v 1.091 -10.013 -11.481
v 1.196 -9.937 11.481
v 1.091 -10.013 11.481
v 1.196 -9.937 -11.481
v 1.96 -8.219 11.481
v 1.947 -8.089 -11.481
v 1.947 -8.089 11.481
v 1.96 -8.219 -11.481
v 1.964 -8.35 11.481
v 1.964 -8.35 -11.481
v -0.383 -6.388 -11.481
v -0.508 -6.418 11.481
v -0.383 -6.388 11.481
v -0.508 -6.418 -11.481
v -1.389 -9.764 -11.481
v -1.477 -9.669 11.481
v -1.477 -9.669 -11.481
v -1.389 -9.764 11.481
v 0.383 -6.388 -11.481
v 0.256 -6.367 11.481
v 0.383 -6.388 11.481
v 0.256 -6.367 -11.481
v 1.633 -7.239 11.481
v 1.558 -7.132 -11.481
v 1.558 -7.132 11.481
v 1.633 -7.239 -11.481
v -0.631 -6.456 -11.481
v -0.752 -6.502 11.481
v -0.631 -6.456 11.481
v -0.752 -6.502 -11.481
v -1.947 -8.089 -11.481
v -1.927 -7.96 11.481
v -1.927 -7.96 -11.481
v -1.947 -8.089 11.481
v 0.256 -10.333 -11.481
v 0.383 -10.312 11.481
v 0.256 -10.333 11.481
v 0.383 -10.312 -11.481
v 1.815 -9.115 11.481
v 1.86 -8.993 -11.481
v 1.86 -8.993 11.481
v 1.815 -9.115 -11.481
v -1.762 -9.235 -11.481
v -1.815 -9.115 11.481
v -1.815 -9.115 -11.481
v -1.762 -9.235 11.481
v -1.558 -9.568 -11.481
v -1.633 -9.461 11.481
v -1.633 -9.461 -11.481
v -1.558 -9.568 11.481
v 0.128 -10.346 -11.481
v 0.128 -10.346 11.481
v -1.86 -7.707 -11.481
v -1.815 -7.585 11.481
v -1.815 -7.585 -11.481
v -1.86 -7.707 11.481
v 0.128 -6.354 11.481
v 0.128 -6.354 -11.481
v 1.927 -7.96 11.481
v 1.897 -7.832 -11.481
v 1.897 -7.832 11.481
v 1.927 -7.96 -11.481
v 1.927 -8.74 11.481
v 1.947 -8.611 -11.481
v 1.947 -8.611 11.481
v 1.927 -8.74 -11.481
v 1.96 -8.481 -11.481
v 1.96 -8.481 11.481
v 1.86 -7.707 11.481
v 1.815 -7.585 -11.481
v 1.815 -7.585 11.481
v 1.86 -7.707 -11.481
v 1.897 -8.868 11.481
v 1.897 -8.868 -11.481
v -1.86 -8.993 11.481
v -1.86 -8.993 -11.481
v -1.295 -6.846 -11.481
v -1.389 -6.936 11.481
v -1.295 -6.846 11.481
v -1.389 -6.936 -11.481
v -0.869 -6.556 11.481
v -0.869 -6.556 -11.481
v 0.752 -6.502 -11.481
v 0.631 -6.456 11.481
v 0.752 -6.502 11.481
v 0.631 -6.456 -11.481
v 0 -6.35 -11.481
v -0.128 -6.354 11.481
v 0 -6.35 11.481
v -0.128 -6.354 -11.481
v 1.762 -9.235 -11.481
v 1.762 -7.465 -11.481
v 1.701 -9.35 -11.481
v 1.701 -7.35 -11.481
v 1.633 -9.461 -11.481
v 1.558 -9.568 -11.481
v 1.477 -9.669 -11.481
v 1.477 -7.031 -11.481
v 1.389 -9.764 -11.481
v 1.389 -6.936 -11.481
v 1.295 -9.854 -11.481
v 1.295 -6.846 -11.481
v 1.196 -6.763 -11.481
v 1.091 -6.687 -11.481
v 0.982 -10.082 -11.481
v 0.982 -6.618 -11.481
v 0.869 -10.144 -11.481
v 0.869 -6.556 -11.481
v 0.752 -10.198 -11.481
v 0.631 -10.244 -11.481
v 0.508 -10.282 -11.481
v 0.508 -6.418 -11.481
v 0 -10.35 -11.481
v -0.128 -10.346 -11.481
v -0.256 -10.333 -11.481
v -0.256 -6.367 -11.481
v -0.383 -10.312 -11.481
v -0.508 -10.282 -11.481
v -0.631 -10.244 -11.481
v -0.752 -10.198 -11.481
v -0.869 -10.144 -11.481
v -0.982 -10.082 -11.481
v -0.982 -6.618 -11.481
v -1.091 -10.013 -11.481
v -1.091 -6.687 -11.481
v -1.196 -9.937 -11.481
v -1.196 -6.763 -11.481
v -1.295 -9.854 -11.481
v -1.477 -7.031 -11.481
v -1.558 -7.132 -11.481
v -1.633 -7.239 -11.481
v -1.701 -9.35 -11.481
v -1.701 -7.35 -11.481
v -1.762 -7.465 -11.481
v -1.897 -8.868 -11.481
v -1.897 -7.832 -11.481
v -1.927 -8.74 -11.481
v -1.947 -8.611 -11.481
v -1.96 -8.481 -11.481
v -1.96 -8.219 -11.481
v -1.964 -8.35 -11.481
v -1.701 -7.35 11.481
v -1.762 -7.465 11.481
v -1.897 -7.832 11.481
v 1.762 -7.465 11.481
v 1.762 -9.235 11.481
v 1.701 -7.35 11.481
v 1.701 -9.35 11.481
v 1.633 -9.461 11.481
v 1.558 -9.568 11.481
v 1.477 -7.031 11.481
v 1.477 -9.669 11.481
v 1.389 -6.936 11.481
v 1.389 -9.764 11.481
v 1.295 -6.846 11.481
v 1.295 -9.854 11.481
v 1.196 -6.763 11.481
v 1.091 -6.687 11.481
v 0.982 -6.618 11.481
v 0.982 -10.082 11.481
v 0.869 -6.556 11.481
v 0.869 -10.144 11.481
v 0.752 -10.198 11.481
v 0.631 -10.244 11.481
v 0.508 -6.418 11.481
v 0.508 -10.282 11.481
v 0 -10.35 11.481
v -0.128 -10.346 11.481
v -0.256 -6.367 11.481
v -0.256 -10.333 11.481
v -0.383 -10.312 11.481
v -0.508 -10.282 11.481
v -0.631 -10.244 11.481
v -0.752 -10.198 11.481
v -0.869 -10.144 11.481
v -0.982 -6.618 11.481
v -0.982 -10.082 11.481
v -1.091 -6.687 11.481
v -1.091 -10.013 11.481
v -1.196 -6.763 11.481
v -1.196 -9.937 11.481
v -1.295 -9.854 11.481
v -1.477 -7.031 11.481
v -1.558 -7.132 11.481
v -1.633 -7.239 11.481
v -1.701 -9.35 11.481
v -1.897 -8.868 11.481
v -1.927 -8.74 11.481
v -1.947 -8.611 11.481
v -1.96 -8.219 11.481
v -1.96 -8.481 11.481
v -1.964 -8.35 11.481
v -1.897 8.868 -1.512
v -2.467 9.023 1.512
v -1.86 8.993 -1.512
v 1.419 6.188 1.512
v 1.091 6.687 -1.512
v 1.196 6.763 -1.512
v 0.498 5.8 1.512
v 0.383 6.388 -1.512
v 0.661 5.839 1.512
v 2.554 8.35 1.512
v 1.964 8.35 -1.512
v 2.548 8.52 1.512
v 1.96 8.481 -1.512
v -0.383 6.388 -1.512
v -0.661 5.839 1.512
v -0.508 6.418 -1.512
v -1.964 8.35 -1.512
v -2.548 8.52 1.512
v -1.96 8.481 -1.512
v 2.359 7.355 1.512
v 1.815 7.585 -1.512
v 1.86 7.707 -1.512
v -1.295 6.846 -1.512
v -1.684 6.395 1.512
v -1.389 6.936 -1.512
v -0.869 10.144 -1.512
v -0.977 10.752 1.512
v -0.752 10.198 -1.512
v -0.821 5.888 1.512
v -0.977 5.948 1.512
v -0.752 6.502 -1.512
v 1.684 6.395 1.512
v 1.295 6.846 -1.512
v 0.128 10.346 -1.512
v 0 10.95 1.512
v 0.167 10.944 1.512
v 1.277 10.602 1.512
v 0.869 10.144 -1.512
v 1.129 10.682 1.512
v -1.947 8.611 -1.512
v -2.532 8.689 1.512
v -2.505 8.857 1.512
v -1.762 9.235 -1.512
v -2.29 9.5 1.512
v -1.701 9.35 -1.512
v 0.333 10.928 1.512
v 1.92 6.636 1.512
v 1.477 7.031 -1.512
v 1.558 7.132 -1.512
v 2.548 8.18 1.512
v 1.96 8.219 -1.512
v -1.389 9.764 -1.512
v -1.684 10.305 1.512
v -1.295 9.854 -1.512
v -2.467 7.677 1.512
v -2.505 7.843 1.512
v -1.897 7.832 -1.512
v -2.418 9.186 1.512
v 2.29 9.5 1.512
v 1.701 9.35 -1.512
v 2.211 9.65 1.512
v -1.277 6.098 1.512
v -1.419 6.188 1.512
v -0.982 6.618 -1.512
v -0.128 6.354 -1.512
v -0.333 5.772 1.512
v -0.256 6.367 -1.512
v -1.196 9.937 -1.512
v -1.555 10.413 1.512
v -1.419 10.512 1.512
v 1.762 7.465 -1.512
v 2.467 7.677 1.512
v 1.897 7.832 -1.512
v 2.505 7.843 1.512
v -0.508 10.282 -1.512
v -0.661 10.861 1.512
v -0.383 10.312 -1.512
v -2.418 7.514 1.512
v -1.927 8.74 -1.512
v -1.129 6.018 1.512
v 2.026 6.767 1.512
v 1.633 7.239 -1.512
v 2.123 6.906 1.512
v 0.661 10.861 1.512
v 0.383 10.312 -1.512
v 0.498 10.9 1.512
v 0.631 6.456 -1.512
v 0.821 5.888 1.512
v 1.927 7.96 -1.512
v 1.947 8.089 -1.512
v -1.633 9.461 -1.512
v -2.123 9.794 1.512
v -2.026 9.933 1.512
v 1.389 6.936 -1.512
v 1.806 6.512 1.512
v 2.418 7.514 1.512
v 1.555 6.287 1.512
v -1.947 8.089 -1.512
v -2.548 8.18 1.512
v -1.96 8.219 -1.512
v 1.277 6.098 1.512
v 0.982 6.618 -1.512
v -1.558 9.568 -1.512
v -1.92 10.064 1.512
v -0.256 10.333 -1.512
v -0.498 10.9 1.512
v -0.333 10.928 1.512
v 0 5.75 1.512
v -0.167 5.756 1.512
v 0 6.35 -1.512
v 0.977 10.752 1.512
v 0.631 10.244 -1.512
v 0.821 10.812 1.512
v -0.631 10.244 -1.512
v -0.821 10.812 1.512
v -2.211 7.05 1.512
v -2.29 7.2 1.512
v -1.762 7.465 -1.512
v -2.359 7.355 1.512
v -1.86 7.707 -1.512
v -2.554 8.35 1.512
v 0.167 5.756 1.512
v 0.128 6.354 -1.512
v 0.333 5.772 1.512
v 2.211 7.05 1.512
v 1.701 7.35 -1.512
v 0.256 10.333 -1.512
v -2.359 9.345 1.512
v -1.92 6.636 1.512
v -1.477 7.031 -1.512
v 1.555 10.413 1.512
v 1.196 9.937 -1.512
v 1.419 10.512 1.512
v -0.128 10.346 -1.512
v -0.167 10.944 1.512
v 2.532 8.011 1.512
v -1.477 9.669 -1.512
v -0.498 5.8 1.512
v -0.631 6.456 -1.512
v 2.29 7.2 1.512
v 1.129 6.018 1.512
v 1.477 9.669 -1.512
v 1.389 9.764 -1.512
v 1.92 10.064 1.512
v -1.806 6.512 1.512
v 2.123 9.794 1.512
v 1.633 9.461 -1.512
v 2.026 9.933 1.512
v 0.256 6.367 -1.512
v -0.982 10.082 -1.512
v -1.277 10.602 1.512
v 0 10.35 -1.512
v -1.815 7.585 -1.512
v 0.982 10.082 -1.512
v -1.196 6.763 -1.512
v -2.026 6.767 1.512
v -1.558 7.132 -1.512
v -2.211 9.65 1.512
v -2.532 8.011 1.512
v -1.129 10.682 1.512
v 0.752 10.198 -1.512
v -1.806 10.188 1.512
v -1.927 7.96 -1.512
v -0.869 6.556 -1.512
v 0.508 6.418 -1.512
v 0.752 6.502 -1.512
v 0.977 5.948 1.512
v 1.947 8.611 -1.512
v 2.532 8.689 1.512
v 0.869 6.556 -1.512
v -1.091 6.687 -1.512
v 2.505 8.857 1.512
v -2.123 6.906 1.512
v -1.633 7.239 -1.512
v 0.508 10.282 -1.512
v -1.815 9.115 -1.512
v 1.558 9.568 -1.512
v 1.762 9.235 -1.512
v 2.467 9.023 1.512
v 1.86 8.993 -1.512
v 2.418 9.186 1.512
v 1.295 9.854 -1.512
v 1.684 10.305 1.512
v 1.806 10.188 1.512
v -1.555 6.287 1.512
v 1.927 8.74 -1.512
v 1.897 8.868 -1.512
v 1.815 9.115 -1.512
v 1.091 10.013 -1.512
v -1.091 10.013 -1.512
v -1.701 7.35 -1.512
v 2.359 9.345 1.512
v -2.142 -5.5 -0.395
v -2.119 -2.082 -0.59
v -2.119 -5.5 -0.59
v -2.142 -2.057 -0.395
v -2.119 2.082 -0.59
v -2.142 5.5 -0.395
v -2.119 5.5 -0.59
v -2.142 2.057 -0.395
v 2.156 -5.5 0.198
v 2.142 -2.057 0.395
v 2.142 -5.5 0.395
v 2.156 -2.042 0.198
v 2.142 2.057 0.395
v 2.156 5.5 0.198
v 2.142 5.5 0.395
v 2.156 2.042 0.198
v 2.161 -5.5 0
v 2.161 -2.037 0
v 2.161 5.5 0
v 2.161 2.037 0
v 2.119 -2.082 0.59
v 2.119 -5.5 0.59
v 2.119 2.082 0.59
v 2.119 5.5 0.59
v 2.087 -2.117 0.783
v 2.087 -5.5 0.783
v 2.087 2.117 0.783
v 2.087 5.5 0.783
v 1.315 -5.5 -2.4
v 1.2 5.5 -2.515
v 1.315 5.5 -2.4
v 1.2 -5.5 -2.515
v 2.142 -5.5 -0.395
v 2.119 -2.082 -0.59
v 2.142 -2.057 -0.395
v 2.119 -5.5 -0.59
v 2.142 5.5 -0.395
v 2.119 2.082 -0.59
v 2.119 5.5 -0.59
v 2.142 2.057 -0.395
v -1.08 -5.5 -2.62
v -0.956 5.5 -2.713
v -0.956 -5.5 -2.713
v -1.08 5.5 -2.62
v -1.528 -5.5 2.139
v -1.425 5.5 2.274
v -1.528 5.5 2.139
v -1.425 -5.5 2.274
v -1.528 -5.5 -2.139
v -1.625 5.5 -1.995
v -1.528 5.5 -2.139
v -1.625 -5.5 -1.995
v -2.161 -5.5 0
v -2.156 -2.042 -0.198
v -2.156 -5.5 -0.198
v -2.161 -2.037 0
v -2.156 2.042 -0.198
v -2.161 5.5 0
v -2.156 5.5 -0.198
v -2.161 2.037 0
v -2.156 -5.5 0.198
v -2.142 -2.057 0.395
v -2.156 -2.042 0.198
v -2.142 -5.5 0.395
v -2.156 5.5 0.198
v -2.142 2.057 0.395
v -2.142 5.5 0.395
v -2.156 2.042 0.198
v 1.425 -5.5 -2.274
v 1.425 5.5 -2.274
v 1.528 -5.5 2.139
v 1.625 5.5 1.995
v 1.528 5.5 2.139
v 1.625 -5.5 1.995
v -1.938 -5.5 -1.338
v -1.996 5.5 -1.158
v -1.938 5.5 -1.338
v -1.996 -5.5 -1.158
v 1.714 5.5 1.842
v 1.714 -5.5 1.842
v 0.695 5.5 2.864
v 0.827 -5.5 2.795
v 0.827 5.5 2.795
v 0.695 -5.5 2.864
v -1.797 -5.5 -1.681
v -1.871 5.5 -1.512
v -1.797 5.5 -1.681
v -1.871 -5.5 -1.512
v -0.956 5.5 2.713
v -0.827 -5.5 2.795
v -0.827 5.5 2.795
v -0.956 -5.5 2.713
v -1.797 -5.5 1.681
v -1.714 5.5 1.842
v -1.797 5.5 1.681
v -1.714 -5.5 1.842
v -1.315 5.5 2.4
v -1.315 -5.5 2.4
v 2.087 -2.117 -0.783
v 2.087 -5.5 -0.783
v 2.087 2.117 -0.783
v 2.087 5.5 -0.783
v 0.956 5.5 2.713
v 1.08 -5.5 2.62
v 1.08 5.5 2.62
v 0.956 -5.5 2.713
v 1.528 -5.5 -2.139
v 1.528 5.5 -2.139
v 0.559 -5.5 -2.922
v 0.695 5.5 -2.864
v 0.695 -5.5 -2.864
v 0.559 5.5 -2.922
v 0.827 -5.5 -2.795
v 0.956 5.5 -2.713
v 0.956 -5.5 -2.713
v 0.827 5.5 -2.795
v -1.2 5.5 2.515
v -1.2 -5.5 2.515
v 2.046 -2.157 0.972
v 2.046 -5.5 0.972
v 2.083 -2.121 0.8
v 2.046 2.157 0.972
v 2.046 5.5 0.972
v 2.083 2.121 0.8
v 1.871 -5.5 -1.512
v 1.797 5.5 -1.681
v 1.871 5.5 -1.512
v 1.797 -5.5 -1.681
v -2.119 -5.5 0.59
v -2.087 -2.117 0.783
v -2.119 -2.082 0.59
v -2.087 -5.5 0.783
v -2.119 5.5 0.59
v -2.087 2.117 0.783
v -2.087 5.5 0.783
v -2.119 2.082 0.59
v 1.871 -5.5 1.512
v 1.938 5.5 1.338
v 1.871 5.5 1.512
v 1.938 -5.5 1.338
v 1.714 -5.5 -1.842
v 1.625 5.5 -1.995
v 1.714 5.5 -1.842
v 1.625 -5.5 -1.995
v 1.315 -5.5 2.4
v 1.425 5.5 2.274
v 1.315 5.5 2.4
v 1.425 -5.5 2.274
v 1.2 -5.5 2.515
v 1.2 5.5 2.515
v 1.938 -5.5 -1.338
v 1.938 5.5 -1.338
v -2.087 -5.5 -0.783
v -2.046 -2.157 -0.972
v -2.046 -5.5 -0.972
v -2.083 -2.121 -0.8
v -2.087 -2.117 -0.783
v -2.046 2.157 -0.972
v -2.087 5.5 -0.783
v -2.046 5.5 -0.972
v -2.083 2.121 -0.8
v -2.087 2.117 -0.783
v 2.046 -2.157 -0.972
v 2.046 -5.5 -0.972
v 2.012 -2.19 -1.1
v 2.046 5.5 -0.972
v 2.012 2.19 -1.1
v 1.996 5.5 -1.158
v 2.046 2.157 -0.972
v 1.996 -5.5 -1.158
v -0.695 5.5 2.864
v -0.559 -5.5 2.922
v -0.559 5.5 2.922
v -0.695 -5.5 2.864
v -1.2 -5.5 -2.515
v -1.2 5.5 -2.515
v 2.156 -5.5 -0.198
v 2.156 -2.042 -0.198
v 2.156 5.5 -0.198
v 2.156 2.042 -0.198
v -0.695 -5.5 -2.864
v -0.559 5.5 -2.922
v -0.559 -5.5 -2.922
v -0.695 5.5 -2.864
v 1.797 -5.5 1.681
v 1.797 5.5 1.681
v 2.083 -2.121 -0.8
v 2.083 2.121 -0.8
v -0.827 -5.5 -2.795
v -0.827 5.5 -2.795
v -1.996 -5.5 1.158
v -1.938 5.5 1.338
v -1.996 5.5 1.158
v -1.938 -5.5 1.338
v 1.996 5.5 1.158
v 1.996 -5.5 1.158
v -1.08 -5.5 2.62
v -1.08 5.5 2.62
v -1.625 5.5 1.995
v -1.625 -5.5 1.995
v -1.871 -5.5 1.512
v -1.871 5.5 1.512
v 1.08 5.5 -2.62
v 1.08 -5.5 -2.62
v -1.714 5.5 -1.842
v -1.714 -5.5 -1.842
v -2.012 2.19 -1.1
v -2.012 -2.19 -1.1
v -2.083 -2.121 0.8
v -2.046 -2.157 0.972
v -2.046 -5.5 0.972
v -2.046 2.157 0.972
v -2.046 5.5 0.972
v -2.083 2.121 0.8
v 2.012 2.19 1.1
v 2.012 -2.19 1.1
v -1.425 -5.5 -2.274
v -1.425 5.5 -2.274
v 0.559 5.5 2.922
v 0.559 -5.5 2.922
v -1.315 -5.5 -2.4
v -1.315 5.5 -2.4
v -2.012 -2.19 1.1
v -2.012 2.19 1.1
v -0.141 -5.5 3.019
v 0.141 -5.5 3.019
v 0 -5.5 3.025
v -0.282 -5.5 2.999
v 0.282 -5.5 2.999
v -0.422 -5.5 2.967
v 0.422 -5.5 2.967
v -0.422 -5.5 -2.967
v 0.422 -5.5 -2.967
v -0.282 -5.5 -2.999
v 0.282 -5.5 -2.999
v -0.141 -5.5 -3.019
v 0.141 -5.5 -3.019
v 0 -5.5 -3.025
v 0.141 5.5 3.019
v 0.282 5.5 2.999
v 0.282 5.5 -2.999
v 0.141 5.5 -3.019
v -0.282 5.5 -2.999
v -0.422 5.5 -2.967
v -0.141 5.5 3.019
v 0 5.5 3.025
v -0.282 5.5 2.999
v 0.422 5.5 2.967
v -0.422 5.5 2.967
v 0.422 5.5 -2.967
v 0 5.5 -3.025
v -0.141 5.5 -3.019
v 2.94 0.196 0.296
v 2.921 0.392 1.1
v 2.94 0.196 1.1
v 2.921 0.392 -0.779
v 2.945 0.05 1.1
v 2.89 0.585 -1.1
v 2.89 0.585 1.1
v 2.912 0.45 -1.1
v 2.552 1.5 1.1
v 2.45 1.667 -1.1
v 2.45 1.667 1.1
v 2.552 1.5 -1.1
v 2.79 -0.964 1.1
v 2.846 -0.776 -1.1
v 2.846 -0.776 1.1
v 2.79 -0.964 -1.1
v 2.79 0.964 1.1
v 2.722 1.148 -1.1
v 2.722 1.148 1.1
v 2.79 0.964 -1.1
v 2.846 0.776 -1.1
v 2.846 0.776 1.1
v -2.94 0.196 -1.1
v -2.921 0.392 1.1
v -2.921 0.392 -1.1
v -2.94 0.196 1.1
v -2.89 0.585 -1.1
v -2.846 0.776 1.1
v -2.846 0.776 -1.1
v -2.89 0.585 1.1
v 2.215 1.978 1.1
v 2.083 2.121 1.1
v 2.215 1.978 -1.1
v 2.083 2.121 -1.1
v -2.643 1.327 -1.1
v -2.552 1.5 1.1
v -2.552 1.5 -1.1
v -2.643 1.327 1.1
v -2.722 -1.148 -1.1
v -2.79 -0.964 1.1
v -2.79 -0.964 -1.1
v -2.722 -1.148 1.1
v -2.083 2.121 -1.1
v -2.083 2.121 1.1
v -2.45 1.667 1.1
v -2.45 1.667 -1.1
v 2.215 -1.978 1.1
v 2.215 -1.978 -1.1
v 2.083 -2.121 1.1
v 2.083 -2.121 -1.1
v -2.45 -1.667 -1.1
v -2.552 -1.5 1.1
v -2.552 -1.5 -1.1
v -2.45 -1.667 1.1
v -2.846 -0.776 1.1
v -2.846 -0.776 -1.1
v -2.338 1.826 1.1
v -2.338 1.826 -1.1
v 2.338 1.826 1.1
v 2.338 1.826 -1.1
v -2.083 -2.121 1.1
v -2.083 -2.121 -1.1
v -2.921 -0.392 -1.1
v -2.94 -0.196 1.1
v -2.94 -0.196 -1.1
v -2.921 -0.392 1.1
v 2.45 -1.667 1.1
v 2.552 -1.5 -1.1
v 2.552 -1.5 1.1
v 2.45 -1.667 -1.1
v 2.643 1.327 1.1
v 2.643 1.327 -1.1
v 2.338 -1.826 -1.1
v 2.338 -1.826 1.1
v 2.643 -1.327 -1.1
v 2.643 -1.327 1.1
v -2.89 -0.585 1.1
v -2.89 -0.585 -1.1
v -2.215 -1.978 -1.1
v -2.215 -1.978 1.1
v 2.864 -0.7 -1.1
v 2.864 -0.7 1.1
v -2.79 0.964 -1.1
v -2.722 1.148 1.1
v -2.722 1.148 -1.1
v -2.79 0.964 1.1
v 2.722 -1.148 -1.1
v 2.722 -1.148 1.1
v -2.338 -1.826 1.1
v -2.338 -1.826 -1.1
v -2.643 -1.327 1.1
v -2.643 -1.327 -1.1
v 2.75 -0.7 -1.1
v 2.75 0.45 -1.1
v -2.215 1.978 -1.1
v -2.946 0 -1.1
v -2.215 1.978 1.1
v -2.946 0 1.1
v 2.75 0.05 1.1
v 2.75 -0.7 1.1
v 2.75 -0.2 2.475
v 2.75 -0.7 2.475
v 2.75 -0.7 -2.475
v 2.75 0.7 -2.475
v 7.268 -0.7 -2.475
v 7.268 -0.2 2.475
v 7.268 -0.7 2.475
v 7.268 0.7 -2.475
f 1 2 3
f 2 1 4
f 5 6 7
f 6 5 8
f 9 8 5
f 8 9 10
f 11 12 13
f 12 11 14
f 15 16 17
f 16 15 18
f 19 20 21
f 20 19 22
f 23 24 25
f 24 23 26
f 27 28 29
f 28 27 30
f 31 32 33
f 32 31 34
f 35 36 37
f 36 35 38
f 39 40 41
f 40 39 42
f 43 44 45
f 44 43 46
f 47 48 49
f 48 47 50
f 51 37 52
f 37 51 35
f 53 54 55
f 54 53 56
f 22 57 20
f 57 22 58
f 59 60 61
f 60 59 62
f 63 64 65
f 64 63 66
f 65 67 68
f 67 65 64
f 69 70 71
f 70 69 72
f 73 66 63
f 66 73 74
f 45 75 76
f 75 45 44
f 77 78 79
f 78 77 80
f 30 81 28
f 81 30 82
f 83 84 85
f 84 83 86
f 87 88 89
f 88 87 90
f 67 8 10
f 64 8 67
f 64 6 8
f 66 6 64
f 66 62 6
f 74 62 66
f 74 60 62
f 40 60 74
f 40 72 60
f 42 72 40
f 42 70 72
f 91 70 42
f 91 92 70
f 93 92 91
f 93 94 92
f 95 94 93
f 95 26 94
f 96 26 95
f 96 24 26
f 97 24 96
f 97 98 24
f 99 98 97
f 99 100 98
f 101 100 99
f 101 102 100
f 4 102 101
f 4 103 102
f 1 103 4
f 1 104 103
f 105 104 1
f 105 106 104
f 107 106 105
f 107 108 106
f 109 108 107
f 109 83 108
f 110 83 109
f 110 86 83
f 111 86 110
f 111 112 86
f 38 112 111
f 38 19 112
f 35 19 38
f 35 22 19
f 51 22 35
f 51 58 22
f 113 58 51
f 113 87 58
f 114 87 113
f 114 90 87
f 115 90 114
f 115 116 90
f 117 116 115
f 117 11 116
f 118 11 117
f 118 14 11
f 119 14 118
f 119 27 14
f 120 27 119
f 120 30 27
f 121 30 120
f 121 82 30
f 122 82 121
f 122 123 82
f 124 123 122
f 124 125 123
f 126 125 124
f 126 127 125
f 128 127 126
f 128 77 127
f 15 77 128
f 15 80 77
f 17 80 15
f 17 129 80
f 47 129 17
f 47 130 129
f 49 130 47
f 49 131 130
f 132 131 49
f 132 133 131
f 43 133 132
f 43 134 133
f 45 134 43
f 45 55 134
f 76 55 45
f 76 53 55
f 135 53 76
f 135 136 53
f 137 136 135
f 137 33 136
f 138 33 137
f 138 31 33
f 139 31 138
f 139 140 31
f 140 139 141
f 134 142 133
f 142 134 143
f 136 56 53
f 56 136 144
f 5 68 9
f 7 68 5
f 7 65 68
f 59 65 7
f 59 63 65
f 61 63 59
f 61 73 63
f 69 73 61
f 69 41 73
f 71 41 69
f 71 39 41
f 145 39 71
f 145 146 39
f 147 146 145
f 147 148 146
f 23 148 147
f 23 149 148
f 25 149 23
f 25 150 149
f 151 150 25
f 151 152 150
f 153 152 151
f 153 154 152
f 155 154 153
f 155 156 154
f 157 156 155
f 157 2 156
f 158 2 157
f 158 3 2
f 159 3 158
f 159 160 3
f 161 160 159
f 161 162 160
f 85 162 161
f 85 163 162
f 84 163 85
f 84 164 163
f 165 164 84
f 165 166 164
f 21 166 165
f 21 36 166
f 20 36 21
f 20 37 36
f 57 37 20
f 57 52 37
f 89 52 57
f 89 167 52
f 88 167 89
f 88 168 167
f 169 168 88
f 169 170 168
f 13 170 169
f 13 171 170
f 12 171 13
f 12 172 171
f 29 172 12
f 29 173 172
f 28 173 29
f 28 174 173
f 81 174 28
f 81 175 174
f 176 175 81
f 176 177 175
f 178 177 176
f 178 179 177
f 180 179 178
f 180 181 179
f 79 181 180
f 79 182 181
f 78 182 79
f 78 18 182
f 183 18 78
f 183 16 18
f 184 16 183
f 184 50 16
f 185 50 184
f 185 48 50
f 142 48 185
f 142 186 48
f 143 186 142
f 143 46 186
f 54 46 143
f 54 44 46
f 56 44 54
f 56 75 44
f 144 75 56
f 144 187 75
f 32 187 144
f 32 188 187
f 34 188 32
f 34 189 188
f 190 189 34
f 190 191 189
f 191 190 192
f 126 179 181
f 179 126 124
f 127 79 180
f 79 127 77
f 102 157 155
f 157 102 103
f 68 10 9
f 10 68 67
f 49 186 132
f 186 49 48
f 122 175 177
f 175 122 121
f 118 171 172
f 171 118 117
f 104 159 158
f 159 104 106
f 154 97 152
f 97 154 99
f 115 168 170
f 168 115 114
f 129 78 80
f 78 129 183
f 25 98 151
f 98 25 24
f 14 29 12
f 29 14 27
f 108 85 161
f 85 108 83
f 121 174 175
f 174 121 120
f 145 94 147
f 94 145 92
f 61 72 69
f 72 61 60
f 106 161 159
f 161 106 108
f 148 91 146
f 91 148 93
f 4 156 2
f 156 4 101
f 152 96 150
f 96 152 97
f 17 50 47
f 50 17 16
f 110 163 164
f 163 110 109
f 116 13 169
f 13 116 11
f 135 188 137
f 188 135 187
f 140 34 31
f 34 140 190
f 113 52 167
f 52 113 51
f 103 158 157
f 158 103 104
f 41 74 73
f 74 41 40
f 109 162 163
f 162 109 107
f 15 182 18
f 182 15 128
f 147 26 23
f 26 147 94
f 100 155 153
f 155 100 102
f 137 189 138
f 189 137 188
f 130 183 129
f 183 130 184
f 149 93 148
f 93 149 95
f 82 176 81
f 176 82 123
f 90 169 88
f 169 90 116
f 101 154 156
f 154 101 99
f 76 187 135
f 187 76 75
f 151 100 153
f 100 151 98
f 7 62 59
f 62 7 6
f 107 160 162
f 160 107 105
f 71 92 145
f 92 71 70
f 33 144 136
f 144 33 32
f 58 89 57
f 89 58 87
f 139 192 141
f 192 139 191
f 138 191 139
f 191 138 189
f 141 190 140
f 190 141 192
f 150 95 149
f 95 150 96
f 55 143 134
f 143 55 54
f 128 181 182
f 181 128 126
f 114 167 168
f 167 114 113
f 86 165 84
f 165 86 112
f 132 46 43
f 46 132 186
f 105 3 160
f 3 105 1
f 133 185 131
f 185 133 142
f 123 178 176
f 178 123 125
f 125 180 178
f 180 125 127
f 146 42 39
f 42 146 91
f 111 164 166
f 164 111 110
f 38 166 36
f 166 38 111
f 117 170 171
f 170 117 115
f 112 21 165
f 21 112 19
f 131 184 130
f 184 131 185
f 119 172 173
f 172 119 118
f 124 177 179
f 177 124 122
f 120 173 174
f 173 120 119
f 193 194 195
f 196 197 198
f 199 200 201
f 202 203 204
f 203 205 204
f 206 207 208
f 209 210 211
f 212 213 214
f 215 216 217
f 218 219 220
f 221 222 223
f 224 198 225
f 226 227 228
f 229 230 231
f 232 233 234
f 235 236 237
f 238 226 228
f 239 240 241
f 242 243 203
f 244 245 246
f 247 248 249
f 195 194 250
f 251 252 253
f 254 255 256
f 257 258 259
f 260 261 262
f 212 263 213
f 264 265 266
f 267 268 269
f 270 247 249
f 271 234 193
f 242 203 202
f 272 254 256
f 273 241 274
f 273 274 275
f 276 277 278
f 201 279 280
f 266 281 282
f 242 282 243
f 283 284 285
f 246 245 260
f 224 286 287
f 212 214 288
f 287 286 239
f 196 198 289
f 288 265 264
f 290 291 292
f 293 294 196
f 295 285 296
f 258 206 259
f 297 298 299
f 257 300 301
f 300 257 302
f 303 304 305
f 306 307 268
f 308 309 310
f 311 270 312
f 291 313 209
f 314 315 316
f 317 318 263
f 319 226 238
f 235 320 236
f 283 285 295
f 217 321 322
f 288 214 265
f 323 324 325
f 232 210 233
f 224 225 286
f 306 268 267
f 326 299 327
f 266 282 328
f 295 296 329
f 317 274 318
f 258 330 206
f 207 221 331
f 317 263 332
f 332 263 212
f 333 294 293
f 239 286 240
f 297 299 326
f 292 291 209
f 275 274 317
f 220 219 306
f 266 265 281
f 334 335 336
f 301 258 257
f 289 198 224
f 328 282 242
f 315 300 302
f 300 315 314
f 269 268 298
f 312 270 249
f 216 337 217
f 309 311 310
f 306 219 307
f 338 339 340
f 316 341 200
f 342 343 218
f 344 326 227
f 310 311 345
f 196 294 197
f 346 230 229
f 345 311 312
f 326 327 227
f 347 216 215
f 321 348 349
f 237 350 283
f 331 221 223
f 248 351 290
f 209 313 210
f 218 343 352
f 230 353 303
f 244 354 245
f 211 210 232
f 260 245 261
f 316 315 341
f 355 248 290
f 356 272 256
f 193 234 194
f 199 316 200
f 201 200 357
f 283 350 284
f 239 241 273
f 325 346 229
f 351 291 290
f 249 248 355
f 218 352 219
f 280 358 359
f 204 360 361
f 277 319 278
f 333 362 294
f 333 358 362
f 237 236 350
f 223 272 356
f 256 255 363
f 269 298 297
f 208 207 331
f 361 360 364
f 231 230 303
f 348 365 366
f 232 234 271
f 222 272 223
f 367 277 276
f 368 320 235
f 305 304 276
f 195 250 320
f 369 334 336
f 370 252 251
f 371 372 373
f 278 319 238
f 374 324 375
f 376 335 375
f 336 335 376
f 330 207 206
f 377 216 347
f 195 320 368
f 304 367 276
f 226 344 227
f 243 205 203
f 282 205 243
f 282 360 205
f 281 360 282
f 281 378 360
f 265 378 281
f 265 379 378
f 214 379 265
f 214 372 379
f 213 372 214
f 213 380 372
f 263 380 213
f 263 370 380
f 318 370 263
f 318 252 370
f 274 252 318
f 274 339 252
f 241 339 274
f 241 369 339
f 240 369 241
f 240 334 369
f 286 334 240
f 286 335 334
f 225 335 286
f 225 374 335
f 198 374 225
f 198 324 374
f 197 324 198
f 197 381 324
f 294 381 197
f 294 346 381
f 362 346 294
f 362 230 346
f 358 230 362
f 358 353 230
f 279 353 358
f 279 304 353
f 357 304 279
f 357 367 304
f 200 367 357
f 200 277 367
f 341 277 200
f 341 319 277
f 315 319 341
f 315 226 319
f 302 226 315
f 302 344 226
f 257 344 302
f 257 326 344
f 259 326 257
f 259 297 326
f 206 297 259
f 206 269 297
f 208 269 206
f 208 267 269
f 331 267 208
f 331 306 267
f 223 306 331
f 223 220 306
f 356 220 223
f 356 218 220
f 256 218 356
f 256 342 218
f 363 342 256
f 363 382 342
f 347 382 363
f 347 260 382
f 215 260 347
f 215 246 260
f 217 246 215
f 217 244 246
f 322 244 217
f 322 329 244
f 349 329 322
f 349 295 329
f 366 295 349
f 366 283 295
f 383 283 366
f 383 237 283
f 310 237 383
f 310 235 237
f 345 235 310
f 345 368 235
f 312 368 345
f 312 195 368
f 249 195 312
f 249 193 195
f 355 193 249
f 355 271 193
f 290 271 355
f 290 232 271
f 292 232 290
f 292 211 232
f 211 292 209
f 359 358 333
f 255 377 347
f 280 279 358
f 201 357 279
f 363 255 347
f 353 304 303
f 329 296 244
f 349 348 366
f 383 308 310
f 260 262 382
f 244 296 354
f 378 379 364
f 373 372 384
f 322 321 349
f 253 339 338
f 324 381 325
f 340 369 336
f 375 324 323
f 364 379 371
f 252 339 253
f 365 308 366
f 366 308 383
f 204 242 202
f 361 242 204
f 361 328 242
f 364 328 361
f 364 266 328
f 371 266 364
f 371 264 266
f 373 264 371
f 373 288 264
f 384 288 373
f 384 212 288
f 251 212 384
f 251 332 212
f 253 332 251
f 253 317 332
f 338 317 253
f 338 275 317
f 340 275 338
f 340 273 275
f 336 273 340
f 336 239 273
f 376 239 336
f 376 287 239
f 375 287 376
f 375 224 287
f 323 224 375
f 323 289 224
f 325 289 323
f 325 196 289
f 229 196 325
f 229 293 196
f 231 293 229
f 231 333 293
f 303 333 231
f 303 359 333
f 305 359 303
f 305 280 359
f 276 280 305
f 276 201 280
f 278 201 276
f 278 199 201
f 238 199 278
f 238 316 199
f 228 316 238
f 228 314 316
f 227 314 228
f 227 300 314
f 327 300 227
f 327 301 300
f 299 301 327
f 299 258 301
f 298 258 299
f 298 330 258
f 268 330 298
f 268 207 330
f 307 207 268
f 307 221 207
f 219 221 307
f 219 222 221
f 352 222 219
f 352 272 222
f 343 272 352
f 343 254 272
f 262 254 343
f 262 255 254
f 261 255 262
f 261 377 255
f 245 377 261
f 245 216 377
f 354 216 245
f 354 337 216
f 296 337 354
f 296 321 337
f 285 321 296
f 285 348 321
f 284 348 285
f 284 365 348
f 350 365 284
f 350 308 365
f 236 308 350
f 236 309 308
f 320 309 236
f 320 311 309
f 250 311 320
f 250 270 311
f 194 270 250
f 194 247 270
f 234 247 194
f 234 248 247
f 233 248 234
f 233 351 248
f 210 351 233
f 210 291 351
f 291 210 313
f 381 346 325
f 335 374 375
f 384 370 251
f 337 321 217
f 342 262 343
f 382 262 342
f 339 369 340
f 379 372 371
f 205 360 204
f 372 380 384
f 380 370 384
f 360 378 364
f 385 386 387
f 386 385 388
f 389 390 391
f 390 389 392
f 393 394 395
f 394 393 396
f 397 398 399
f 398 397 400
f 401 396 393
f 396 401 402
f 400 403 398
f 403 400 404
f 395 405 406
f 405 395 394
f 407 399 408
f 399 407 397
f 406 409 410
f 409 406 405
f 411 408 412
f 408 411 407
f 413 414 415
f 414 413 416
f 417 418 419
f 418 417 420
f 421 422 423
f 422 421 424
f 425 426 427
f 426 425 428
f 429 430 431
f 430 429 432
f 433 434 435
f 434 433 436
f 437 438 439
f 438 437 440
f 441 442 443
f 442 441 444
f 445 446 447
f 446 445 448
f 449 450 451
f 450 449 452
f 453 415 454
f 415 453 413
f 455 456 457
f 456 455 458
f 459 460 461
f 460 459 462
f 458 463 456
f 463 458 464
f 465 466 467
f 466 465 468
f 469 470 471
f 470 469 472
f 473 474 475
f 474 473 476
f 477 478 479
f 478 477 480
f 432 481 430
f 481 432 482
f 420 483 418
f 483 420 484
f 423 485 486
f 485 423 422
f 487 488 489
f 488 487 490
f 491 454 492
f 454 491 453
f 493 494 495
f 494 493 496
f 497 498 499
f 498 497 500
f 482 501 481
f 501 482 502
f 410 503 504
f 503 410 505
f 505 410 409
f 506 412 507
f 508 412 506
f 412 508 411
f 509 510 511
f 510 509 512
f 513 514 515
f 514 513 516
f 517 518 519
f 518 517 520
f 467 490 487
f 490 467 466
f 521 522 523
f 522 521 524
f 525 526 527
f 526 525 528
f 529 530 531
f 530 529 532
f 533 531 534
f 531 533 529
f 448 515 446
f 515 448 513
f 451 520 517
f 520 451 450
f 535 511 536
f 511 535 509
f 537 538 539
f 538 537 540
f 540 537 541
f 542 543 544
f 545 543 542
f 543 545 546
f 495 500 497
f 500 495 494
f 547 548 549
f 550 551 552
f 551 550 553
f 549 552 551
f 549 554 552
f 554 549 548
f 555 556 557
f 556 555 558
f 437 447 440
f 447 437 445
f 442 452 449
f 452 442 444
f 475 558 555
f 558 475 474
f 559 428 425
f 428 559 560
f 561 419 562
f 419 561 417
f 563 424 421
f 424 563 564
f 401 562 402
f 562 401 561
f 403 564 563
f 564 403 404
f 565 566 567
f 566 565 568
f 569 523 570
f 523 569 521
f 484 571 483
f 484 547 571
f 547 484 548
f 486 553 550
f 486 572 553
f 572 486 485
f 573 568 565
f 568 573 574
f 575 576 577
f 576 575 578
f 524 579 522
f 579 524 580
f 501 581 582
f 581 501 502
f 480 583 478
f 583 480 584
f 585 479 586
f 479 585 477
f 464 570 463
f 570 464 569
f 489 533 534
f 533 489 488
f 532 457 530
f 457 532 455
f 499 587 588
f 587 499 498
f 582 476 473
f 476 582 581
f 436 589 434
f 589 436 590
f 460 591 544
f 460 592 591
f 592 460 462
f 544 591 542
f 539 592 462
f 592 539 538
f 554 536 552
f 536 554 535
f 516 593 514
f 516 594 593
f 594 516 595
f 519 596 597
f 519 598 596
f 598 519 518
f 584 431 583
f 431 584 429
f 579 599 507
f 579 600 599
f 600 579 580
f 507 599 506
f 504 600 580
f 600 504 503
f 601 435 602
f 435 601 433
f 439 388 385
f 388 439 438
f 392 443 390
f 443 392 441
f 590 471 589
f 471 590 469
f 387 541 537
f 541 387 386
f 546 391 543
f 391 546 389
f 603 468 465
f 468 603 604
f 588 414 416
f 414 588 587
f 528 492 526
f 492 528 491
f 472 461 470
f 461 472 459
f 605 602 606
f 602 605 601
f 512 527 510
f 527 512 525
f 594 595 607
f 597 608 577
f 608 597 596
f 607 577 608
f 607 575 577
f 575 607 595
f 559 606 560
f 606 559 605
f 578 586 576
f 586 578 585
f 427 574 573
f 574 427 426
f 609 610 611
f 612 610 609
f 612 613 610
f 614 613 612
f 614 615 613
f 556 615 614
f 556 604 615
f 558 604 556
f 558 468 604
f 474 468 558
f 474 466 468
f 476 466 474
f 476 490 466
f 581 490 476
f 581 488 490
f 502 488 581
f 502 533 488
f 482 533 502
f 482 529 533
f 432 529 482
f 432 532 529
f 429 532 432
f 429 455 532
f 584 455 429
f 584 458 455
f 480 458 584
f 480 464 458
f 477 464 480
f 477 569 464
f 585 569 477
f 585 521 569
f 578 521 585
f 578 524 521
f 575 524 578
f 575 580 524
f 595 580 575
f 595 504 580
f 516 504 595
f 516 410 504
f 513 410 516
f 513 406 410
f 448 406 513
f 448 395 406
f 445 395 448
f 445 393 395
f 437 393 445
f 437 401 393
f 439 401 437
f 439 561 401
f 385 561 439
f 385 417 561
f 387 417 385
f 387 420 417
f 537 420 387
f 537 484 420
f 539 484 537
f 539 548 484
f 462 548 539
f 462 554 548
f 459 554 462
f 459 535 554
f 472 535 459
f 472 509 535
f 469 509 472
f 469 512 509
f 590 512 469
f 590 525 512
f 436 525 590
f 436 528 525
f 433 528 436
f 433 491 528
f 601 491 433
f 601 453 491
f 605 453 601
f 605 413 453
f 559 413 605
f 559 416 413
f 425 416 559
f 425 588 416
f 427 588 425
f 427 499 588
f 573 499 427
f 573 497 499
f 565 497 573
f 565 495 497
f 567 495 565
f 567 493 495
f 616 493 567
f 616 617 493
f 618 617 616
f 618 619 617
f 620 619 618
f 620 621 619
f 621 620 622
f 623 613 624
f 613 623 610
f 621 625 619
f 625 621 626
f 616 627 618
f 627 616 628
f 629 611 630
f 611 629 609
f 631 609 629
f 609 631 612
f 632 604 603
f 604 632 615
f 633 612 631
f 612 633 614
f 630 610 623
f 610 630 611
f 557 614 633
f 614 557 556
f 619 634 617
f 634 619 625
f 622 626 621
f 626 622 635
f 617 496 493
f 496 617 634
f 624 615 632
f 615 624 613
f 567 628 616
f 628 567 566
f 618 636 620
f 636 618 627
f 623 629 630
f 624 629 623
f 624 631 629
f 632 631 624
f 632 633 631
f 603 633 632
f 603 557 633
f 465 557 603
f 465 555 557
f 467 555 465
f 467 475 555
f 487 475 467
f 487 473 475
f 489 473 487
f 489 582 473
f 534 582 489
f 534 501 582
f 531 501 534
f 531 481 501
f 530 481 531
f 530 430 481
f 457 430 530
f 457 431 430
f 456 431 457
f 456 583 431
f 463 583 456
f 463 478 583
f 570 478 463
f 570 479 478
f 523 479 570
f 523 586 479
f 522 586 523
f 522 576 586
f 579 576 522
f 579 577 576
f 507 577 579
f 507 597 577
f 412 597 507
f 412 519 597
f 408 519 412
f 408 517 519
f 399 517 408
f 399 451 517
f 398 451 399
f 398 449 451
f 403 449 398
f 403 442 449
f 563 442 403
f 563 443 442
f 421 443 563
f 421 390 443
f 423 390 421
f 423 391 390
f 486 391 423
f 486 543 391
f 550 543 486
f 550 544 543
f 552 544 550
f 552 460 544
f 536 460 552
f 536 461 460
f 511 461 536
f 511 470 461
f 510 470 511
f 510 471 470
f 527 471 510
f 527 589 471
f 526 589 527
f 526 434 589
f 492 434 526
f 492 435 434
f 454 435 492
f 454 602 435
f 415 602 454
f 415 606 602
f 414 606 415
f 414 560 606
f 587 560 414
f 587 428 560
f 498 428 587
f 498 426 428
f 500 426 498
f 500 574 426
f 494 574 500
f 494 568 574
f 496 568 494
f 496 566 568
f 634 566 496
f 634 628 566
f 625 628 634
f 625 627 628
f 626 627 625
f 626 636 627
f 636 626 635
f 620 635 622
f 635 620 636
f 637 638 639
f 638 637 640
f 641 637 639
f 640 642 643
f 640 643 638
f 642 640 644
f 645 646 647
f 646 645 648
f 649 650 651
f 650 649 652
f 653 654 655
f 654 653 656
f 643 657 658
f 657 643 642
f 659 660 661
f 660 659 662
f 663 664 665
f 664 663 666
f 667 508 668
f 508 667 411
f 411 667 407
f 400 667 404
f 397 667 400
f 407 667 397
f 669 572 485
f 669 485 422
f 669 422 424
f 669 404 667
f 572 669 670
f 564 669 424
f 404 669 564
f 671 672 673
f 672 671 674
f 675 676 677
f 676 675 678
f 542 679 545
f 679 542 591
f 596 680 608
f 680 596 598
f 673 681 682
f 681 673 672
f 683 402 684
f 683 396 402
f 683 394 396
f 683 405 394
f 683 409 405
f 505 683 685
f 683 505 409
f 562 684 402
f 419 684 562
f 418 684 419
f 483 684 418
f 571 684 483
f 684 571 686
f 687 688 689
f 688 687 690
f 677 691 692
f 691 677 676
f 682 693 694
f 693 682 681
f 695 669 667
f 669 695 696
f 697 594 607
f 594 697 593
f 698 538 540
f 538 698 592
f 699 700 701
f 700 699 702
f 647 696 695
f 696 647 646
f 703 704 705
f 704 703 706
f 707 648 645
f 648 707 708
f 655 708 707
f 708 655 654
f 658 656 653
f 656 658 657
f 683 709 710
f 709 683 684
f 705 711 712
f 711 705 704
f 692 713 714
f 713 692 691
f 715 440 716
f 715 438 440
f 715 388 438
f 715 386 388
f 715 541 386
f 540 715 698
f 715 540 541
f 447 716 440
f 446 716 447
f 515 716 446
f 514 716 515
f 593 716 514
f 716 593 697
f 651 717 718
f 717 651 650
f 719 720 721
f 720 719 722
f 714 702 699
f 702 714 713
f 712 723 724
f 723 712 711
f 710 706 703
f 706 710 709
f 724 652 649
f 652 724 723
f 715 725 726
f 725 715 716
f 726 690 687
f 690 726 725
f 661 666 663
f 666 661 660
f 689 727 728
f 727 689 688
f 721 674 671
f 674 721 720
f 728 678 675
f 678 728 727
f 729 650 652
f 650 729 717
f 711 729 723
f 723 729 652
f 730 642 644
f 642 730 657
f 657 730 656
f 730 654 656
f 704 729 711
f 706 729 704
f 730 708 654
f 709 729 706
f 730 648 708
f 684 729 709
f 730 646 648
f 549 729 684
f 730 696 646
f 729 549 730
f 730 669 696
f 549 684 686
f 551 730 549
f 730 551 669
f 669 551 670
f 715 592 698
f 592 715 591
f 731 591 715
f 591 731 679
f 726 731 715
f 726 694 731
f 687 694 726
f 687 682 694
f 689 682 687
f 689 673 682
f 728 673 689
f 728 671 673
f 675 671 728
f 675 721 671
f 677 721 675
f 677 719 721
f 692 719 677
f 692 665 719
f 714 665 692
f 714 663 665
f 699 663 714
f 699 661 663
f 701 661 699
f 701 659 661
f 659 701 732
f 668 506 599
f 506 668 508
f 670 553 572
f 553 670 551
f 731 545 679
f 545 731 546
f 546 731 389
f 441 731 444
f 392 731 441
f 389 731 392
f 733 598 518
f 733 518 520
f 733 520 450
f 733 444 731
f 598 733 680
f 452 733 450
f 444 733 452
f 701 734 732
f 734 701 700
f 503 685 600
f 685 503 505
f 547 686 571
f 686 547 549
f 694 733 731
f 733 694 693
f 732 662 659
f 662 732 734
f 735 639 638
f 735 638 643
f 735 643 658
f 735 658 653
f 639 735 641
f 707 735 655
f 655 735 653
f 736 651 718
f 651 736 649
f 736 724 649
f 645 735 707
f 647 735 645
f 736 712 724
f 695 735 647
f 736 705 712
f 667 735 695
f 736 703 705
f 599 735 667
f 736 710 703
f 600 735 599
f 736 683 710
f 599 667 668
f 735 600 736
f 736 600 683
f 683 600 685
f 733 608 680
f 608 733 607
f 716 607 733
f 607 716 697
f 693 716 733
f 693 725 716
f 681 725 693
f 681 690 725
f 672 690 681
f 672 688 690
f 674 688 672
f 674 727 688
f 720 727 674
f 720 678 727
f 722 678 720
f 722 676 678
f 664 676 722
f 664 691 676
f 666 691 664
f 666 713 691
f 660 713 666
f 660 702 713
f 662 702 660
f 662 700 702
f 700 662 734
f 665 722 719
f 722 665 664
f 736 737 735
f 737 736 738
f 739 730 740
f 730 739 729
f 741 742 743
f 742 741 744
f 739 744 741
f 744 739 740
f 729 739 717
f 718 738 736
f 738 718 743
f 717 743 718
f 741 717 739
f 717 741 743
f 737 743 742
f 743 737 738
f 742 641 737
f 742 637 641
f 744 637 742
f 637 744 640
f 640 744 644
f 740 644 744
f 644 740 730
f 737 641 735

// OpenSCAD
$fn=96;

bbox_x = 11.0;
bbox_y = 18.9;
bbox_z = 8.8;

shank_r = 2.0;
shank_len = 18.9;
flare_len = 2.2;
flare_r2 = 2.6;

cross_r = 2.2;
cross_len = 11.0;

boss_r = 3.0;
boss_t = 1.6;

tab_len = 4.6;
tab_w = 3.6;
tab_t = 1.4;
tab_wedge = 0.9;

fork_len = 3.2;
fork_gap = 1.2;
fork_prong_min = 0.9;
fork_prong_max = 1.6;

module shank_with_flare() {
    union() {
        translate([0, -shank_len/2 + flare_len/2, 0])
            cylinder(h=shank_len - flare_len, r=shank_r, center=true);
        translate([0, shank_len/2 - flare_len/2, 0])
            cylinder(h=flare_len, r1=shank_r, r2=flare_r2, center=true);
    }
}

module cross_body() {
    cylinder(h=cross_len, r=cross_r, center=true);
}

module boss() {
    cylinder(h=boss_t, r=boss_r, center=true);
}

module wedge_tab() {
    translate([boss_r + tab_len/2 - 0.2, 0, 0])
        rotate([0, 90, 0])
            linear_extrude(height=tab_len, center=true, convexity=10)
                polygon(points=[
                    [-tab_w/2, -tab_t/2],
                    [ tab_w/2, -tab_t/2],
                    [ tab_w/2,  tab_t/2],
                    [-tab_w/2,  tab_t/2 - tab_wedge]
                ]);
}

module fork_end() {
    difference() {
        translate([0, 0, cross_len/2 - fork_len/2])
            cylinder(h=fork_len, r=cross_r, center=true);
        translate([0, 0, cross_len/2 - fork_len/2])
            cube([fork_gap, 2*cross_r + 0.6, fork_len + 0.4], center=true);
        translate([0, 0, cross_len/2 - fork_len/2])
            rotate([0, 0, 90])
                cylinder(h=fork_len + 0.6, r=fork_gap/2, center=true);
    }
    translate([0, 0, cross_len/2 - fork_len/2])
        intersection() {
            cylinder(h=fork_len, r=cross_r, center=true);
            union() {
                translate([ (fork_gap/2 + fork_prong_min/2), 0, 0])
                    cube([fork_prong_min, 2*cross_r + 0.2, fork_len], center=true);
                translate([-(fork_gap/2 + fork_prong_min/2), 0, 0])
                    cube([fork_prong_min, 2*cross_r + 0.2, fork_len], center=true);
            }
        }
    translate([0, 0, cross_len/2 - fork_len/2])
        intersection() {
            cylinder(h=fork_len, r=cross_r, center=true);
            union() {
                translate([ (fork_gap/2 + fork_prong_max/2), 0, 0])
                    cube([fork_prong_max, 2*cross_r + 0.2, fork_len*0.55], center=true);
                translate([-(fork_gap/2 + fork_prong_max/2), 0, 0])
                    cube([fork_prong_max, 2*cross_r + 0.2, fork_len*0.55], center=true);
            }
        }
}

module fastener() {
    union() {
        shank_with_flare();
        rotate([90, 0, 0]) cross_body();
        rotate([90, 0, 0]) fork_end();
        boss();
        wedge_tab();
    }
}

scale([
    bbox_x / (2*boss_r + tab_len + 0.6),
    bbox_y / shank_len,
    bbox_z / (2*max(boss_r, cross_r) + 0.4)
]) fastener();
